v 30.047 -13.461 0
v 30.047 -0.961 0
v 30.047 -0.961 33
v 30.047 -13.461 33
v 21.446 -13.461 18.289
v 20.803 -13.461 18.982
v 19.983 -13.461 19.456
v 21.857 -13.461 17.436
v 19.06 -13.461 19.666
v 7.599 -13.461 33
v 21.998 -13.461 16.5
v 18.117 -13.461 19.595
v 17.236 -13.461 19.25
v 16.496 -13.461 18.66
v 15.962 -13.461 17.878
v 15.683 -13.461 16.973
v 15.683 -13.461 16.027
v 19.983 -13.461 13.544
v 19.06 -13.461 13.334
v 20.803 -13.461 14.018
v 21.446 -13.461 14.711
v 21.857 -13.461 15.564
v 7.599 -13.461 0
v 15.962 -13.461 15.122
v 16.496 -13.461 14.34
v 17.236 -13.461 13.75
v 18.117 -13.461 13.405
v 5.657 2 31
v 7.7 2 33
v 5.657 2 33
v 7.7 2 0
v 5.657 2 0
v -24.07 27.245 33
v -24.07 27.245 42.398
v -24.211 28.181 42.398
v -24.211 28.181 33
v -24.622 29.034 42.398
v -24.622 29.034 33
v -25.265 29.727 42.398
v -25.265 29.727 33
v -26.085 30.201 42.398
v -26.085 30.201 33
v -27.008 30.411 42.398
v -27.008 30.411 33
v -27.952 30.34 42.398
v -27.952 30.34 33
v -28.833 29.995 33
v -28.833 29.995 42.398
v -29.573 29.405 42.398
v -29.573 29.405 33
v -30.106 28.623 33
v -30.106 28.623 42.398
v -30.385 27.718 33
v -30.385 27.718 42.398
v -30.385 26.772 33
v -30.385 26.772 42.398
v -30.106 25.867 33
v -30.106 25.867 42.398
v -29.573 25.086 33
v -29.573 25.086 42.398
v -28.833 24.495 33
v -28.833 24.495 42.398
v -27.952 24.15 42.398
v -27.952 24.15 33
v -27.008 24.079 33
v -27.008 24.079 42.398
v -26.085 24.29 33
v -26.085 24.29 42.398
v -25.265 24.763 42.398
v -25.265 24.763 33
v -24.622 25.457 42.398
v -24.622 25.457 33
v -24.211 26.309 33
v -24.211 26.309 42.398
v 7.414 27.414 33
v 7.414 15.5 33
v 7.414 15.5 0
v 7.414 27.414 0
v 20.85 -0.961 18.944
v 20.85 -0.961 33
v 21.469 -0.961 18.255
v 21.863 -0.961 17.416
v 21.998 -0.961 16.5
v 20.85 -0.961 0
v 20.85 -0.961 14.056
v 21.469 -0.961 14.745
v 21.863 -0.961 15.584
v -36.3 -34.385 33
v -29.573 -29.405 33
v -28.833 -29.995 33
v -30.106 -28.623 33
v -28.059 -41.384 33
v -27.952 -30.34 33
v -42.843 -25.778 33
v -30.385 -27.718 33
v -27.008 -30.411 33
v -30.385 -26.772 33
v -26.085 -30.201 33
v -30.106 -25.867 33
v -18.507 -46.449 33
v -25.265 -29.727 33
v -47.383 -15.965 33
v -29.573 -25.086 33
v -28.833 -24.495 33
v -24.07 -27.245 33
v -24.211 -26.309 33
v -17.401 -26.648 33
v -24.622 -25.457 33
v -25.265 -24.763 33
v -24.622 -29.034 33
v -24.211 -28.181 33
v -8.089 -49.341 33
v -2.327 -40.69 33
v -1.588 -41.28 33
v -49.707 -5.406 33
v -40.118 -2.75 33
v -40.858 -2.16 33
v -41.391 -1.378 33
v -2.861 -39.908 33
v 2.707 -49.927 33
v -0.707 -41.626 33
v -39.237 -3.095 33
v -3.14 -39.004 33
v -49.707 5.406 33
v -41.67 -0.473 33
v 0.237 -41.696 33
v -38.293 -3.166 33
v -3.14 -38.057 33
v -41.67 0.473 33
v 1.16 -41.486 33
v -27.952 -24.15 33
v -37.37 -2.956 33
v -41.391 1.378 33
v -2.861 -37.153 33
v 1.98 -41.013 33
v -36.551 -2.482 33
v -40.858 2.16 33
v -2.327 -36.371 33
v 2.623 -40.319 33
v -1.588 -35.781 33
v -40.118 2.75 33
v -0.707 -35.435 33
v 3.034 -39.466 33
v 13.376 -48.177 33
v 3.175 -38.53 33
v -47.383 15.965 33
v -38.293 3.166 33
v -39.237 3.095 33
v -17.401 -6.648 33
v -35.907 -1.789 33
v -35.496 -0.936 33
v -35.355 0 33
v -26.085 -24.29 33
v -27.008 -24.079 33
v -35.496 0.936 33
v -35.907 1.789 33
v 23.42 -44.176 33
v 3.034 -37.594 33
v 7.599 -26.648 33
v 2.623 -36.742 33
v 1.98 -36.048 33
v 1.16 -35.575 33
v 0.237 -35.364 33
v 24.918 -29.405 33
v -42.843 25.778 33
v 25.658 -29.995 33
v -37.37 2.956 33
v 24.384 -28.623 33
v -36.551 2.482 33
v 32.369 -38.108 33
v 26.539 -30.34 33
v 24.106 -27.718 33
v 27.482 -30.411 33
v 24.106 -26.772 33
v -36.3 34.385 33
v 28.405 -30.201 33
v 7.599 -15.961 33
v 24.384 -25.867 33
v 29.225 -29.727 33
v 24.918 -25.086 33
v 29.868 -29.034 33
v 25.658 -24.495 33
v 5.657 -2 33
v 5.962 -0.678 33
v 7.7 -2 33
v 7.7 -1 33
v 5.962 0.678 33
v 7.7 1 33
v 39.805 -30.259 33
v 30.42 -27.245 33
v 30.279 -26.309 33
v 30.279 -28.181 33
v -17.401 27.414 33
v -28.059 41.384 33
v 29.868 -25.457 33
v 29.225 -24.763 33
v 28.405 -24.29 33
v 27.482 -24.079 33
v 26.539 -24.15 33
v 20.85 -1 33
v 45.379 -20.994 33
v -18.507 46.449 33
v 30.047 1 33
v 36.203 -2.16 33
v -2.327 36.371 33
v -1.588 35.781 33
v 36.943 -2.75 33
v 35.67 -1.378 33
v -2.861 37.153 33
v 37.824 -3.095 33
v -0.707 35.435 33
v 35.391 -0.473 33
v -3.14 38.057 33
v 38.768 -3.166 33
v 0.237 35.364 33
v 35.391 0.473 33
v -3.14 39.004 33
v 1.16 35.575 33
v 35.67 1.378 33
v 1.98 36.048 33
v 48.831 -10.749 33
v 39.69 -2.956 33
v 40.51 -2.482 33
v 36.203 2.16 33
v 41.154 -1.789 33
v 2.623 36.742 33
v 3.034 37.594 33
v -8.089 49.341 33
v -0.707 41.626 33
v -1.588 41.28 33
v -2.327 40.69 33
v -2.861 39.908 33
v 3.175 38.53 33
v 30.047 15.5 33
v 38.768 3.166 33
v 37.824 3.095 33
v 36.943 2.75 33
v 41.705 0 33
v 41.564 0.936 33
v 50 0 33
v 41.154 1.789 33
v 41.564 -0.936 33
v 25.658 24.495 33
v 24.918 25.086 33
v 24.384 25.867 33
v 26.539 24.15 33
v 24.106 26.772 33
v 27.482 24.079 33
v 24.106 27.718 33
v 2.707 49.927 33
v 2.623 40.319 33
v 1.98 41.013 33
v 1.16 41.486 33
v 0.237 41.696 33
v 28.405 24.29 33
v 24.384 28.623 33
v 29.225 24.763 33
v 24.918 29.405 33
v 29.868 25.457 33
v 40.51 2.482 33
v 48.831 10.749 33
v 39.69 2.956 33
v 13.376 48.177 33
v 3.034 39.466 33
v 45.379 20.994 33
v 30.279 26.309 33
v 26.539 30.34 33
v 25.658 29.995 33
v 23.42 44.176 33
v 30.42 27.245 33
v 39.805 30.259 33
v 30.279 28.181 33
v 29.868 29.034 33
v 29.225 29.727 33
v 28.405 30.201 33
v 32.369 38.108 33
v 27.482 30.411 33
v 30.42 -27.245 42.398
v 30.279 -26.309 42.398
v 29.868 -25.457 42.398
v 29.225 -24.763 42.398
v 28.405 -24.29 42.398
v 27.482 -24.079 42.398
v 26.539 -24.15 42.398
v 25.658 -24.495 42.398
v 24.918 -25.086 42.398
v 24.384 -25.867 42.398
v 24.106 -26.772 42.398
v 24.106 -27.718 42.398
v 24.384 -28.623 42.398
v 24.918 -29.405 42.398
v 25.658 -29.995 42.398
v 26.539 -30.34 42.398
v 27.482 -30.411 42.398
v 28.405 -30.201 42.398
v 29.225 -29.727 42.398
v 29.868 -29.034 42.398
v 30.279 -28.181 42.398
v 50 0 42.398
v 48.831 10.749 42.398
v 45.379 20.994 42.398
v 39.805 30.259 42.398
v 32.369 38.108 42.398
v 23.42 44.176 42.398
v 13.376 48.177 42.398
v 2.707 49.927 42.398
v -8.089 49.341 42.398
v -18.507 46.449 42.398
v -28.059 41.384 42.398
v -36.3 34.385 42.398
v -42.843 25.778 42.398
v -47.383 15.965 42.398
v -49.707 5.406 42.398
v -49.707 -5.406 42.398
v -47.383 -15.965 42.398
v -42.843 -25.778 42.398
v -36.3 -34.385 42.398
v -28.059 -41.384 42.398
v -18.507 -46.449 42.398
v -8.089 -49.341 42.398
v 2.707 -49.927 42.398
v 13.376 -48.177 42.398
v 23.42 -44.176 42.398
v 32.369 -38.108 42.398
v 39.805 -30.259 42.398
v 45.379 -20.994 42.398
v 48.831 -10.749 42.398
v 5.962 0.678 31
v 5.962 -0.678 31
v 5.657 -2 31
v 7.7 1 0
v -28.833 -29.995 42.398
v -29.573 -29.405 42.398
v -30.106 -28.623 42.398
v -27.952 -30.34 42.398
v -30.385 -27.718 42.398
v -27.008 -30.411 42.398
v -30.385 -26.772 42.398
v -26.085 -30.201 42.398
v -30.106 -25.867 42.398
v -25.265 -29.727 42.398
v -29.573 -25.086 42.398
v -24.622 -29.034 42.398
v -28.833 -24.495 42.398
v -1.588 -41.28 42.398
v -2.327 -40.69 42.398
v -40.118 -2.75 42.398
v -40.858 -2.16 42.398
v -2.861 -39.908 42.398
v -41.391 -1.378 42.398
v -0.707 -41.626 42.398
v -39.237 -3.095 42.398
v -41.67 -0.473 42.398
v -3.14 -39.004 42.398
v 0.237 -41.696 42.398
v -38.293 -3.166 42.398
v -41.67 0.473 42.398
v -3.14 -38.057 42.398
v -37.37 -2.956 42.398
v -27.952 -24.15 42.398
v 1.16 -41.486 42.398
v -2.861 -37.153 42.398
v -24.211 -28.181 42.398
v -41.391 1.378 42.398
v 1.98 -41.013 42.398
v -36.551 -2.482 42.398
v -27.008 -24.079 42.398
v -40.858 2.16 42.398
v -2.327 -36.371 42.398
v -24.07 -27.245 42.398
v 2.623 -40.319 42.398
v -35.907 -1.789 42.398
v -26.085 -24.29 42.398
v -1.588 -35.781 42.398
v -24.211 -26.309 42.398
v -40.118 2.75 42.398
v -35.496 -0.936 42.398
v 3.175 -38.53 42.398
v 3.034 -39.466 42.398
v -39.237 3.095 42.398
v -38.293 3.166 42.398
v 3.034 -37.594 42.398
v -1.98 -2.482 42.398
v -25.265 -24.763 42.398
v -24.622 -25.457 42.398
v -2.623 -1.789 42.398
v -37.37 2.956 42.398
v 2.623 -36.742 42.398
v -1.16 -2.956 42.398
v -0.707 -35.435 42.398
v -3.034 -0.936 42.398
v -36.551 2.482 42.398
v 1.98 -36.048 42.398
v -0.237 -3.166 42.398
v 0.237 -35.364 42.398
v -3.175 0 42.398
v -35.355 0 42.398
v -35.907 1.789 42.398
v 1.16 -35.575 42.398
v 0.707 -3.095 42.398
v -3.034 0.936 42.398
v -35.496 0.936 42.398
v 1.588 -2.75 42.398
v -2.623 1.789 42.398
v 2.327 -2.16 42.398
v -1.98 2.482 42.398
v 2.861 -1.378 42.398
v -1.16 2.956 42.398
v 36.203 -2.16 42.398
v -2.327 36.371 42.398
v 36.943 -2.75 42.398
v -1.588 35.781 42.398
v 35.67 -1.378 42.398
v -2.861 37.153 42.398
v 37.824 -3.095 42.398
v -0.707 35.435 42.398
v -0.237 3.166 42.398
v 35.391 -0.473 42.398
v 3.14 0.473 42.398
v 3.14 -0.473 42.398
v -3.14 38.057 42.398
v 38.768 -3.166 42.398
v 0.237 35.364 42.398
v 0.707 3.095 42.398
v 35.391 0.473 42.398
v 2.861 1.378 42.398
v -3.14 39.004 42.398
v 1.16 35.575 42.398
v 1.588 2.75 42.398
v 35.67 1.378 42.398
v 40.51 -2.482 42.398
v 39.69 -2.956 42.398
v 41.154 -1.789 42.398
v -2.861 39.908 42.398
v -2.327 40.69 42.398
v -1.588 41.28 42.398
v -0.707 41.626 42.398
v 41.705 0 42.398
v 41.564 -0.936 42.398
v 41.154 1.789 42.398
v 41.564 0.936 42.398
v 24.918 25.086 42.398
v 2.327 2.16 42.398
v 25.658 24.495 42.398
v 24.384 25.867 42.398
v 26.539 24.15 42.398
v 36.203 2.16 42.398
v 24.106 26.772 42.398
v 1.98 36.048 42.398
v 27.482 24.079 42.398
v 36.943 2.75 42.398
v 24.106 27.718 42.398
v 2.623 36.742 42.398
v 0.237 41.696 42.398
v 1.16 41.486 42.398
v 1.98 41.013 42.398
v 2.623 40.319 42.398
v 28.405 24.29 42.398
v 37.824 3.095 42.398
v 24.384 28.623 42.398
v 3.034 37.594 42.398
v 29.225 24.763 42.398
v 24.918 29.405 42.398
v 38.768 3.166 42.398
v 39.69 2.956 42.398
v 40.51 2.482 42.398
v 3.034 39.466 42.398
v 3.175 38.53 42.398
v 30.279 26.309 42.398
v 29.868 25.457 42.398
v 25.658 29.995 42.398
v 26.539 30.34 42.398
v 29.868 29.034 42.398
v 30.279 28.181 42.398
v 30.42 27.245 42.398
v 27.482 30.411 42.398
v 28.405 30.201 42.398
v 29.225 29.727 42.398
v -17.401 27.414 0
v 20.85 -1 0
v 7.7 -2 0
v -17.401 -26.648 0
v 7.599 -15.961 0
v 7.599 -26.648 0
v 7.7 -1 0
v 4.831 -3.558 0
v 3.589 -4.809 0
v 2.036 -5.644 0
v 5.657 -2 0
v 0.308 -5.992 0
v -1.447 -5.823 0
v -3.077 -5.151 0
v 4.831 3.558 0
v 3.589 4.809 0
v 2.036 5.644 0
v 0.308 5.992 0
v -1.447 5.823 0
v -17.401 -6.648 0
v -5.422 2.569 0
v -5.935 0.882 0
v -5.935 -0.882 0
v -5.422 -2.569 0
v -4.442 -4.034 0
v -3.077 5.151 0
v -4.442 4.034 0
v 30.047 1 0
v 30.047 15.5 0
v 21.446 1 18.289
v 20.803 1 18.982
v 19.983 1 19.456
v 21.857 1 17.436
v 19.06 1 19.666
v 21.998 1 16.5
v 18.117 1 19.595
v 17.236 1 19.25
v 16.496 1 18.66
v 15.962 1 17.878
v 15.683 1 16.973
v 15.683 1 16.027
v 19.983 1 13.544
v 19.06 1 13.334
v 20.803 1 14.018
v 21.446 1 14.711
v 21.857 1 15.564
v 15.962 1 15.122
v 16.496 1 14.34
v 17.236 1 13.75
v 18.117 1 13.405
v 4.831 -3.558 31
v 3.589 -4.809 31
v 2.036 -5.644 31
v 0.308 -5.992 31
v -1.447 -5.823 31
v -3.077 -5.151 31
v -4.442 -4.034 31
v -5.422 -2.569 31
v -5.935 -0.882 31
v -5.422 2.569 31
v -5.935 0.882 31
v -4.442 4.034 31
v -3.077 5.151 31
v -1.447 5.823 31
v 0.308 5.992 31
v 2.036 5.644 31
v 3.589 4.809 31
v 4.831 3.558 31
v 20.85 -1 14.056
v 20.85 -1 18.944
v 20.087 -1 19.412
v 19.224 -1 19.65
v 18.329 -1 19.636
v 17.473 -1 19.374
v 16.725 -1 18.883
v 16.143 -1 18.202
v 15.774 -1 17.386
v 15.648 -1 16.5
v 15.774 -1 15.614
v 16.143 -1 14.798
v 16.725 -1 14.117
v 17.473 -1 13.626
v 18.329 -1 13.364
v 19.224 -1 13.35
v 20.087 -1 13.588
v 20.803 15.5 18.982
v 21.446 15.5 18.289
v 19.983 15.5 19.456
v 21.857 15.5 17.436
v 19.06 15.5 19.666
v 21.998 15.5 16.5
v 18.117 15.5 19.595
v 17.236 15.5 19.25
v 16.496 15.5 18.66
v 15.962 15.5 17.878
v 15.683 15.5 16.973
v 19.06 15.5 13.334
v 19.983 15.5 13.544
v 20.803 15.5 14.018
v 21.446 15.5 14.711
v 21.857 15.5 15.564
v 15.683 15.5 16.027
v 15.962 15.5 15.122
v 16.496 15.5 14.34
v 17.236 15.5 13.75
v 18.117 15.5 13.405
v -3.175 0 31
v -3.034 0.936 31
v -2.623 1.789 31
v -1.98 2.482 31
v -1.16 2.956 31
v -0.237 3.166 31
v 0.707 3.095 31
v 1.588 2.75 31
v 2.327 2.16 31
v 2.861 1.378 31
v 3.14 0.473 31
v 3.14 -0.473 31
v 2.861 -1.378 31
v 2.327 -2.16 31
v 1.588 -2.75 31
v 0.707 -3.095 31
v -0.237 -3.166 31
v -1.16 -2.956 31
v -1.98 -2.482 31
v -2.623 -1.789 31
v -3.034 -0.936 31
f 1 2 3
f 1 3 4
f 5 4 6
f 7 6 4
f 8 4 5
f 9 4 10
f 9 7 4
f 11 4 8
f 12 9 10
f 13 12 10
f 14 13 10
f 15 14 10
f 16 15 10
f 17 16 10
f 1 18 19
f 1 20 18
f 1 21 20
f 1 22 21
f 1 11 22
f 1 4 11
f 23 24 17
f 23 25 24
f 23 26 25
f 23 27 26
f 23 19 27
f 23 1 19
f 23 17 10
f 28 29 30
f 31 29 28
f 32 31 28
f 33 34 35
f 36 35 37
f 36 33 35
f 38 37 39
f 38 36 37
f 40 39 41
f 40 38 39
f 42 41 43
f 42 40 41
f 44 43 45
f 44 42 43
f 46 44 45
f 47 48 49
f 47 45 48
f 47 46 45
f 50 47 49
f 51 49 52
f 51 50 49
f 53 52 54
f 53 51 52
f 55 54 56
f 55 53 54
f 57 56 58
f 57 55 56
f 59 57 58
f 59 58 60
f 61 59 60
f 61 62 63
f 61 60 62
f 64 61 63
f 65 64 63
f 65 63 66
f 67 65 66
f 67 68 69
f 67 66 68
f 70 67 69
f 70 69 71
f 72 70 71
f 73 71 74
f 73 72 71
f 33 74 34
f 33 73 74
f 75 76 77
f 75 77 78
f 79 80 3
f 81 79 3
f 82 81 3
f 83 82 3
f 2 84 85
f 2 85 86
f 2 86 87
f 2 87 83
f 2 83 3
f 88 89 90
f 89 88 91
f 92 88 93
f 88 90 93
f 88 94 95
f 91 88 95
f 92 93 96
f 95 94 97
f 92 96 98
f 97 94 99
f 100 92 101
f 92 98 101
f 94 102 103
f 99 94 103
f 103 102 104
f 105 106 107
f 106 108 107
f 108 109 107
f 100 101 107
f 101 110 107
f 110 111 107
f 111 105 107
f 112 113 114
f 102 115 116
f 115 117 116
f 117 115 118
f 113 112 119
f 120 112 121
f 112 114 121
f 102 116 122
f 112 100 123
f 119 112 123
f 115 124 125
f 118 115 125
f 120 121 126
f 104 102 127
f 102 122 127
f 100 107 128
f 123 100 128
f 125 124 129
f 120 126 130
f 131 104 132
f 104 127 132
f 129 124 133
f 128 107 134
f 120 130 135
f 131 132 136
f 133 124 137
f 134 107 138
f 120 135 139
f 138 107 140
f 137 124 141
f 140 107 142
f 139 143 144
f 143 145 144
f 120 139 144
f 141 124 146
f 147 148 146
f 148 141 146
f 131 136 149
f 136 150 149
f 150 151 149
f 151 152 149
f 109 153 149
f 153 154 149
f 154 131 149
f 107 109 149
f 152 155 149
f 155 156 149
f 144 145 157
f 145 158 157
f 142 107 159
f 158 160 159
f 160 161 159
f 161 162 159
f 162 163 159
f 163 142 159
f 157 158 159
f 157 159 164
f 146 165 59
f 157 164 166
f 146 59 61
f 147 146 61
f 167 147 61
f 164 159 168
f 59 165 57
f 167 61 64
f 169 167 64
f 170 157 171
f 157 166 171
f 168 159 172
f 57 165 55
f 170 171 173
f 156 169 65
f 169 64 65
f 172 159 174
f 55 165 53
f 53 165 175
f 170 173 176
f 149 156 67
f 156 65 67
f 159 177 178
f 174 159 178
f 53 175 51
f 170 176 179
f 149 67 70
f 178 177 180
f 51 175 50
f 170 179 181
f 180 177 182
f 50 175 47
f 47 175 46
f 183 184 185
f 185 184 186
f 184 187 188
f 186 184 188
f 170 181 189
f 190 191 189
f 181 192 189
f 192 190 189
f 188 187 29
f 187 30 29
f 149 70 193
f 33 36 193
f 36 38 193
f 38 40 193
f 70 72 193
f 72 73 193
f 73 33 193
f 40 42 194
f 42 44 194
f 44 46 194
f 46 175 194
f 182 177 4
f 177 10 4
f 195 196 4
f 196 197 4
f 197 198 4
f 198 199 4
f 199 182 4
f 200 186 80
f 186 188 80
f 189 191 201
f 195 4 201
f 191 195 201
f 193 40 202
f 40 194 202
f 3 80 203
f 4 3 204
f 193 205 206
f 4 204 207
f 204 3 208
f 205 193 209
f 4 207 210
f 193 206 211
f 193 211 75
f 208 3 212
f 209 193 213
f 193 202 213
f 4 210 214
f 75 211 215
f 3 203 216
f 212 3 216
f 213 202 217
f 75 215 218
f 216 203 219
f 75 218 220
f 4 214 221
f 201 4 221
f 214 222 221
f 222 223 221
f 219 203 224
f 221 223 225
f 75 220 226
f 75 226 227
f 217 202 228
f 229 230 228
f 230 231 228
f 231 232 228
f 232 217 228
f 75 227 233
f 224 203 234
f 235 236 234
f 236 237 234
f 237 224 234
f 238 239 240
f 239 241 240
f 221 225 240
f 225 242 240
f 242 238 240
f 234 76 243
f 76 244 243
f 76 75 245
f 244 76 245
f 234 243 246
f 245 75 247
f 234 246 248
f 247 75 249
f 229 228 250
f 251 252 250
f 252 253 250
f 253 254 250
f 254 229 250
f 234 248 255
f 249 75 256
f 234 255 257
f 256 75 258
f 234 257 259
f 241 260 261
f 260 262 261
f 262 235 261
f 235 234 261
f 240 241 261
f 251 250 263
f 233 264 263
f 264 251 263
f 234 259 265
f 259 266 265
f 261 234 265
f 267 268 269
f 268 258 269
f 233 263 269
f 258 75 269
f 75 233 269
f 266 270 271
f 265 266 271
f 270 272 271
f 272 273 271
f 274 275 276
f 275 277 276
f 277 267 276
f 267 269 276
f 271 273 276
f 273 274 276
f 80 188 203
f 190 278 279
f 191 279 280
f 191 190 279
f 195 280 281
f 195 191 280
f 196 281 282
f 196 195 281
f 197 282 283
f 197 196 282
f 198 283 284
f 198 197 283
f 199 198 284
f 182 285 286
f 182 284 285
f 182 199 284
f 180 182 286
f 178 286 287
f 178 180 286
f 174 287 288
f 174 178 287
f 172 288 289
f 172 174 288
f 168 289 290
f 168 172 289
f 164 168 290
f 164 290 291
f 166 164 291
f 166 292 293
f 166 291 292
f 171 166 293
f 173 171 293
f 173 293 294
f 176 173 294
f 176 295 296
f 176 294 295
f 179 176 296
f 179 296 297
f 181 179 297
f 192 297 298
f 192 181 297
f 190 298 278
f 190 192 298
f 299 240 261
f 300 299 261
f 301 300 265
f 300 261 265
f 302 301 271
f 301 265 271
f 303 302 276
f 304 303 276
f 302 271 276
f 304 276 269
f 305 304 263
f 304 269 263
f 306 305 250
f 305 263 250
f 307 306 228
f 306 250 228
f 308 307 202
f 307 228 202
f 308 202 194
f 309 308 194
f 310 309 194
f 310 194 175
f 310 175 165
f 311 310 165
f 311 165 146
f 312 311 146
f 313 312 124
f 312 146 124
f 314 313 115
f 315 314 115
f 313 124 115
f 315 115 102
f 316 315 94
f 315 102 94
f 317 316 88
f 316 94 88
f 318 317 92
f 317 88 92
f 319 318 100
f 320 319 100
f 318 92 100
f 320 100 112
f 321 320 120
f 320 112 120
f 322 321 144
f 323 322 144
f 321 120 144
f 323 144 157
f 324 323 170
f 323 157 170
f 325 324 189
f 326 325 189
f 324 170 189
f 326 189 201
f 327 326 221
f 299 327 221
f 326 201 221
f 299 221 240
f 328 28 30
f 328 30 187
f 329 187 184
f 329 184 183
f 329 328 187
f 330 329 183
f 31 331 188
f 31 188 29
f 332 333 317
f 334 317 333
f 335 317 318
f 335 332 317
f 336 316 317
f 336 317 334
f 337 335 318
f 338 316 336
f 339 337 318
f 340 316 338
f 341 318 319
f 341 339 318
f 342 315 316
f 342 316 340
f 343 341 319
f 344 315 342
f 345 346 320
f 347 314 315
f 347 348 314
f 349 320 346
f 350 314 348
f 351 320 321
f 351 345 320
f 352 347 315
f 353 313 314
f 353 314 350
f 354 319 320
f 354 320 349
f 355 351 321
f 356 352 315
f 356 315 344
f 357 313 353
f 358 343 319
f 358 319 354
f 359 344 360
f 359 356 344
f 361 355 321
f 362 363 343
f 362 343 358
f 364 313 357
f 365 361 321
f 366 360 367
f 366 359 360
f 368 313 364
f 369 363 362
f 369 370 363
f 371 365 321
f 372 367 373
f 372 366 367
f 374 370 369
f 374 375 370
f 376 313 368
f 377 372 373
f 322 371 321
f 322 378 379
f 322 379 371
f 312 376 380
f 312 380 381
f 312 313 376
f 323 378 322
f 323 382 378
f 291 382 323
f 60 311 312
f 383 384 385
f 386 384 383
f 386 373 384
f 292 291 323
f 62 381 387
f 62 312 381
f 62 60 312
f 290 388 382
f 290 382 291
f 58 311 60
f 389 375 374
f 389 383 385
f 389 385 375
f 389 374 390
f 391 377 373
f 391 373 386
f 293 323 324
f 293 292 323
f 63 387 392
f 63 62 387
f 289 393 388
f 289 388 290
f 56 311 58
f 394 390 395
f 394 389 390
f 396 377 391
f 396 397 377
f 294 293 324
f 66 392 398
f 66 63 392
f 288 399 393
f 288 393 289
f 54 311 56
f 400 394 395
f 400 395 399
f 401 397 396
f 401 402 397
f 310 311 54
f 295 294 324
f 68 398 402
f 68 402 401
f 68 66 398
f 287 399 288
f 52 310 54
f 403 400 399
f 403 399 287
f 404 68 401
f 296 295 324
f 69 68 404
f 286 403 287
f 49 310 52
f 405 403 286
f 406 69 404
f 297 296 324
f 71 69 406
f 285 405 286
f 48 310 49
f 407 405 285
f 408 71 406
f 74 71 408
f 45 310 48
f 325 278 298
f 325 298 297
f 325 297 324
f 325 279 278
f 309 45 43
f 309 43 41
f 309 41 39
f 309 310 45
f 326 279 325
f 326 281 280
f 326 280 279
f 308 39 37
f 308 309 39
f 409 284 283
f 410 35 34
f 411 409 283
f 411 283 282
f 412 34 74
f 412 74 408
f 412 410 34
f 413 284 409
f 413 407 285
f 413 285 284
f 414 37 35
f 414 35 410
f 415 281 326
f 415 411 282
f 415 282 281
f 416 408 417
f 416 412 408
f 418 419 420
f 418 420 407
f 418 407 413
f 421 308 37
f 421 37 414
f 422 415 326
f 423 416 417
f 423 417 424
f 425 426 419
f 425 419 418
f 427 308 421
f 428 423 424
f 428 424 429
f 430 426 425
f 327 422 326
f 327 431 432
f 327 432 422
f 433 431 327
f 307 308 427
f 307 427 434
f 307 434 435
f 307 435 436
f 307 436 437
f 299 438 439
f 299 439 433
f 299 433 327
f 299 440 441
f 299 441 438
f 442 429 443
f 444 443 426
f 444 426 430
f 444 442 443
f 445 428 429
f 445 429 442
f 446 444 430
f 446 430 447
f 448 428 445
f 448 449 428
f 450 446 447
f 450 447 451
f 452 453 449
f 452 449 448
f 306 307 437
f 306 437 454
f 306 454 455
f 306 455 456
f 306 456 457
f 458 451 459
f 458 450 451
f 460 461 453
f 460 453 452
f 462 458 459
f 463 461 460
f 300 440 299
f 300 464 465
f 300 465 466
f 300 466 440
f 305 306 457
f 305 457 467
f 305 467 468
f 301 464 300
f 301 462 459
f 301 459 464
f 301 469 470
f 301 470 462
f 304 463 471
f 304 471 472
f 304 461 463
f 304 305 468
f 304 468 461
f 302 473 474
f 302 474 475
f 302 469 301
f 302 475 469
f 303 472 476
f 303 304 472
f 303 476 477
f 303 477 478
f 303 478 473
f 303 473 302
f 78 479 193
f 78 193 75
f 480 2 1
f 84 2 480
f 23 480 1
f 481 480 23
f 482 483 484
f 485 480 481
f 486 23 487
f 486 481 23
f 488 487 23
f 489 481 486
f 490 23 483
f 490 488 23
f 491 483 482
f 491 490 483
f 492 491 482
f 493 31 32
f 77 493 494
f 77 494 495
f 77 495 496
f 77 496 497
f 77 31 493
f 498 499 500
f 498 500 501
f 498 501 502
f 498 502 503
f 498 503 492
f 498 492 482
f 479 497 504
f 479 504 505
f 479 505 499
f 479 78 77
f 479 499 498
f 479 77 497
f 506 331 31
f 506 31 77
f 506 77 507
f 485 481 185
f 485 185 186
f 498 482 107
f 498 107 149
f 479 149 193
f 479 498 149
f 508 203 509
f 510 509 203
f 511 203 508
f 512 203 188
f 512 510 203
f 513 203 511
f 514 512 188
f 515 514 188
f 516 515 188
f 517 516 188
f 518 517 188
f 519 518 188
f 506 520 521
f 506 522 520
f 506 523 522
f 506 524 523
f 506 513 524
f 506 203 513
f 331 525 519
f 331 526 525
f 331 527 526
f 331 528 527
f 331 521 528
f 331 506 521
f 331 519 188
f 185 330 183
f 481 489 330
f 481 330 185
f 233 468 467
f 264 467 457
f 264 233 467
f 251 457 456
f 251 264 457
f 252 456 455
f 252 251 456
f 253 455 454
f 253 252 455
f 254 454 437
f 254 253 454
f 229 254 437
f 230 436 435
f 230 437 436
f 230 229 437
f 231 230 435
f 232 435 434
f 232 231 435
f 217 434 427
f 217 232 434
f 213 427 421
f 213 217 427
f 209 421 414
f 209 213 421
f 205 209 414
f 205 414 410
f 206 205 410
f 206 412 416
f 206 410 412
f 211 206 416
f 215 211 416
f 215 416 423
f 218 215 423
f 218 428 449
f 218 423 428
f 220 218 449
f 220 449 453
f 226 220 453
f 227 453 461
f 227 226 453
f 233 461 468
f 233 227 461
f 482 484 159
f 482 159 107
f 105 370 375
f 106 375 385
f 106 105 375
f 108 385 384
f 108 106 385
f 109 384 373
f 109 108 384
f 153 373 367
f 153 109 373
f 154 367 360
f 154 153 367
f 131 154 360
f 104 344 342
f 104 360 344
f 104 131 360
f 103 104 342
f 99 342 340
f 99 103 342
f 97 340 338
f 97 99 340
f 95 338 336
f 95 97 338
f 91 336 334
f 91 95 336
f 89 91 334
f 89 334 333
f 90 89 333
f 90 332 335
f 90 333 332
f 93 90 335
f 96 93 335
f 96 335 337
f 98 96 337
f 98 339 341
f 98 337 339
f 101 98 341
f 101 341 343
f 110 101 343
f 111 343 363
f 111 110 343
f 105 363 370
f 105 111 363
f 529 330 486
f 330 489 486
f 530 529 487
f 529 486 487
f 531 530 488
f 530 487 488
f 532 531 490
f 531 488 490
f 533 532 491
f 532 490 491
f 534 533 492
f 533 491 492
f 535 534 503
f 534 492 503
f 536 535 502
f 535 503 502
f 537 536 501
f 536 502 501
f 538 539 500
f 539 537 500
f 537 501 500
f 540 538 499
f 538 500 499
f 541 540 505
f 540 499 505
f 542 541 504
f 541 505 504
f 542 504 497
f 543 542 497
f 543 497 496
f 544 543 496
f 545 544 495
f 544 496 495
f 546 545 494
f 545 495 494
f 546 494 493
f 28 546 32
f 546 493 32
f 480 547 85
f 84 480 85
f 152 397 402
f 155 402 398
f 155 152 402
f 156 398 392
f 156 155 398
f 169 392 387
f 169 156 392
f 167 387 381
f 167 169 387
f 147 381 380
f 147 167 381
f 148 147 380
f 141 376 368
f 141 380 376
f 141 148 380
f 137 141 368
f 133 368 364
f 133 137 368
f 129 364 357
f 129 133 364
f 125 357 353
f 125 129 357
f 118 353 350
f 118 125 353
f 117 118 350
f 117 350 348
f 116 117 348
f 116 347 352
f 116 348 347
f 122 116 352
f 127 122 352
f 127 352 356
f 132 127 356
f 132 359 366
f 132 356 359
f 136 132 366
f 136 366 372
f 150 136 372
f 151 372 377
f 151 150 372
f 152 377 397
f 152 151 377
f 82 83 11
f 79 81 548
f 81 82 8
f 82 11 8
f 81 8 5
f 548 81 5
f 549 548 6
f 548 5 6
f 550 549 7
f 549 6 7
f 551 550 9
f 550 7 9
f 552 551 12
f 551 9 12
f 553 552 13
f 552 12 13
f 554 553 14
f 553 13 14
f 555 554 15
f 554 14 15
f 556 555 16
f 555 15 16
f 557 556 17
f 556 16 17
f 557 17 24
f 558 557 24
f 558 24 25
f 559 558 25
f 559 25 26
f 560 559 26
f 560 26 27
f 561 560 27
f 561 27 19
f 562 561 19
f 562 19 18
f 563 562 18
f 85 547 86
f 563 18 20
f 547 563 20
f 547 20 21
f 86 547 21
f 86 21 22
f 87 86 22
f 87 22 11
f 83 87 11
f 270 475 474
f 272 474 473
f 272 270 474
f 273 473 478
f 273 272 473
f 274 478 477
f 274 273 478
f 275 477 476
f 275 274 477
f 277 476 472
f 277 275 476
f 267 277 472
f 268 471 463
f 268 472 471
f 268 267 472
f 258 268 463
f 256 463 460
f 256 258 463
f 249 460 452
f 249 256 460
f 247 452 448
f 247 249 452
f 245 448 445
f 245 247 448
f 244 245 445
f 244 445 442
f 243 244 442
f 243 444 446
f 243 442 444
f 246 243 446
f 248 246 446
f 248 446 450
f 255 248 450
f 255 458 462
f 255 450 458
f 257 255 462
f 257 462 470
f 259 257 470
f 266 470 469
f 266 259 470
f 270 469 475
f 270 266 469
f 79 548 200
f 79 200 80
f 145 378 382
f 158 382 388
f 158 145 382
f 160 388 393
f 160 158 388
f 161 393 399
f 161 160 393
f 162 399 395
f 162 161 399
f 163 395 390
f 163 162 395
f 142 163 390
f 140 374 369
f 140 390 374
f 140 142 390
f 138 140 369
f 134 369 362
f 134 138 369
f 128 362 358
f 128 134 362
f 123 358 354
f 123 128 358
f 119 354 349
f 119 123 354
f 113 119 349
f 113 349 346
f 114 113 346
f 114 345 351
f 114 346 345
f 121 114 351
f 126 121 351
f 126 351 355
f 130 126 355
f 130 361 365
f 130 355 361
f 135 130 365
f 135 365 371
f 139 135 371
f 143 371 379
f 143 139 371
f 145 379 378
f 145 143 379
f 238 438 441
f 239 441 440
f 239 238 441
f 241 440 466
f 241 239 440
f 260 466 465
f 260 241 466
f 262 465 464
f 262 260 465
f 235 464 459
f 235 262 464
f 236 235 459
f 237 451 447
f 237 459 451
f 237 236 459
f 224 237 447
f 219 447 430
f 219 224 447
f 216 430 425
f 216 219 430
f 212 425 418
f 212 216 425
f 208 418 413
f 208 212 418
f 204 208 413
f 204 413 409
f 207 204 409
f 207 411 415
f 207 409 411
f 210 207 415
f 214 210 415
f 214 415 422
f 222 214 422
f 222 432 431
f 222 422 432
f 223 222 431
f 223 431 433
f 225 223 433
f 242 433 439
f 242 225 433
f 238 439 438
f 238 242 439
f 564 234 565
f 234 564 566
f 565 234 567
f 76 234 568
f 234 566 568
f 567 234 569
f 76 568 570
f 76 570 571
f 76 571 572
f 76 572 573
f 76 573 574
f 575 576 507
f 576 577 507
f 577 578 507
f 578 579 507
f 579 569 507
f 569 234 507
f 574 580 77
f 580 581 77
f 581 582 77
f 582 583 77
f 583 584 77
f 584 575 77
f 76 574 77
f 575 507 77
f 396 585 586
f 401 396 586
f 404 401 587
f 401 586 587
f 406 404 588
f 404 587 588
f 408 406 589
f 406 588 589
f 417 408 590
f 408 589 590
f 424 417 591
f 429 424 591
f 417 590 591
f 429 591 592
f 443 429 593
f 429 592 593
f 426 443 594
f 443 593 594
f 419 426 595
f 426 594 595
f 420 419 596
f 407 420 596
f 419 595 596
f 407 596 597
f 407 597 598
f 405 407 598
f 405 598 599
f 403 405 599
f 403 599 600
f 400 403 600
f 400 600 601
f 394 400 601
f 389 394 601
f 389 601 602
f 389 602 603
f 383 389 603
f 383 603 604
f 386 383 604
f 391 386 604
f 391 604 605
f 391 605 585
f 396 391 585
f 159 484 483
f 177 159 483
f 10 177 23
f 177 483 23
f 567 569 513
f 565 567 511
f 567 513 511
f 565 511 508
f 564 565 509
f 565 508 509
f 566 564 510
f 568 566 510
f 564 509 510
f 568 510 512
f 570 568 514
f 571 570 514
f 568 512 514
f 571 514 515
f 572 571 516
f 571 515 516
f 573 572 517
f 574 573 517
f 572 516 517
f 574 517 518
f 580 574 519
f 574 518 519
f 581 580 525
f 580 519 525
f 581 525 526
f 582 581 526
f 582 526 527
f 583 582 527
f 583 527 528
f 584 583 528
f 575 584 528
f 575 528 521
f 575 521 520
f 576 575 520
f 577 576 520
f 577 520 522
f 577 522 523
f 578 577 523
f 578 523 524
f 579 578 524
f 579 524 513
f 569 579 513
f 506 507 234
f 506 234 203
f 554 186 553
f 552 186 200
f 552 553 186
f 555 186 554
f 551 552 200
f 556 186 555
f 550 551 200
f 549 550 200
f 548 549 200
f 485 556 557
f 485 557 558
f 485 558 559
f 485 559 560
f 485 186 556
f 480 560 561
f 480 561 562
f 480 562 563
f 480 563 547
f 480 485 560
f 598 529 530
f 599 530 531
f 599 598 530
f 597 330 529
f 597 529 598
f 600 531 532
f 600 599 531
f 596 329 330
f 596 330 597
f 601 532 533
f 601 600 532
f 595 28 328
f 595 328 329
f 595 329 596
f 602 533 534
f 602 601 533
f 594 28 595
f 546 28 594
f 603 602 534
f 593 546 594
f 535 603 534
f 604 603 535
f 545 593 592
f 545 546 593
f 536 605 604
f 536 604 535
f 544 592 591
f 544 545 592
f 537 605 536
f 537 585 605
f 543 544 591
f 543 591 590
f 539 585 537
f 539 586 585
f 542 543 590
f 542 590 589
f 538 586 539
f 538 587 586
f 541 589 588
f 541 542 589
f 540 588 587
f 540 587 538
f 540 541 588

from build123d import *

# Parameters (mm, degrees)
SKETCH_1_W           = 30
SKETCH_1_H           = 14.828427124
EXTRUDE_2_DEPTH      = 33
CUT_EXTRUDE_9_DEPTH  = 46
CUT_EXTRUDE_10_DEPTH = 30
CUT_EXTRUDE_12_DEPTH = 40
CUT_EXTRUDE_13_DEPTH = 46
CUT_EXTRUDE_18_DEPTH = 285
SKETCH_12_R          = 50
EXTRUDE_7_DEPTH      = 9.398
SKETCH_12_5_R        = 3.175
CUT_EXTRUDE_27_DEPTH = 63
SKETCH_20_R          = 6
SKETCH_20_R_2        = 3.175
EXTRUDE_9_DEPTH      = 3
SKETCH_1_26_W        = 11
SKETCH_1_26_H        = 2
CUT_EXTRUDE_29_DEPTH = 31
SKETCH_1_27_W        = 11
SKETCH_1_27_H        = 2
CUT_EXTRUDE_30_DEPTH = 33
CUT_EXTRUDE_31_DEPTH = 33
CUT_EXTRUDE_32_DEPTH = 33
SKETCH_21_R          = 6
SKETCH_21_R_2        = 3.175
EXTRUDE_11_DEPTH     = 34
SKETCH_21_5_R        = 6
SKETCH_21_5_R_2      = 3.175
CUT_EXTRUDE_34_DEPTH = 31
SKETCH_22_R          = 3.175
CUT_EXTRUDE_35_DEPTH = 31
SKETCH_24_W          = 25
SKETCH_24_H          = 20
EXTRUDE_12_DEPTH     = 33
EXTRUDE_13_DEPTH     = 34
SKETCH_25_W          = 9.1968428
SKETCH_25_H          = 2.038804585
SKETCH_25_H_2        = 2
EXTRUDE_14_DEPTH     = 33
EXTRUDE_15_DEPTH     = 36
SKETCH_28_W          = 22.632732516
SKETCH_28_H          = 2.5
SKETCH_28_W_2        = 22.447864345
CUT_EXTRUDE_43_DEPTH = 33
SKETCH_1_32_W        = 0.7
SKETCH_1_32_H        = 1
CUT_EXTRUDE_45_DEPTH = 33
SKETCH_27_R          = 3.175
CUT_EXTRUDE_46_DEPTH = 70


with BuildPart() as part:
    # 草图1 → 凸台-拉伸2 (new body)
    with BuildSketch(Plane.XY):
        with Locations((7.585786438, 0)):
            Rectangle(SKETCH_1_W, SKETCH_1_H)
    extrude(amount=EXTRUDE_2_DEPTH)

    # 草图1<11> → 切除-拉伸9 (cut)
    with BuildSketch(Plane.XY):
        with BuildLine():
            Line((0, -2), (0, 0))
            Line((0, 0), (-6, 0))
            ThreePointArc((-6, 0), (-4.242640687, -4.242640687), (0, -6))
            ThreePointArc((0, -6), (3.464101615, -4.898979486), (5.656854249, -2))
            Line((5.656854249, -2), (0, -2))
        make_face()
    extrude(amount=CUT_EXTRUDE_9_DEPTH, mode=Mode.SUBTRACT)

    # 草图1<12> → 切除-拉伸10 (cut)
    with BuildSketch(Plane.XY):
        with BuildLine():
            Line((-6, 0), (0, 0))
            Line((0, 0), (0, 2))
            Line((0, 2), (0, 6))
            ThreePointArc((0, 6), (-4.242640687, 4.242640687), (-6, 0))
        make_face()
    extrude(amount=CUT_EXTRUDE_10_DEPTH, mode=Mode.SUBTRACT)

    # 草图1<14> → 切除-拉伸12 (cut)
    with BuildSketch(Plane.XY):
        with BuildLine():
            Line((6, 0), (0, 0))
            Line((0, 0), (0, -2))
            Line((0, -2), (5.656854249, -2))
            ThreePointArc((5.656854249, -2), (5.913591358, -1.014611872), (6, 0))
        make_face()
    extrude(amount=CUT_EXTRUDE_12_DEPTH, mode=Mode.SUBTRACT)

    # 草图1<15> → 切除-拉伸13 (cut)
    with BuildSketch(Plane.XY):
        with BuildLine():
            Line((0, 6), (0, 2))
            Line((0, 2), (5.656854249, 2))
            ThreePointArc((5.656854249, 2), (3.464101615, 4.898979486), (0, 6))
        make_face()
    extrude(amount=CUT_EXTRUDE_13_DEPTH, mode=Mode.SUBTRACT)

    # 草图1<20> → 切除-拉伸18 (cut)
    with BuildSketch(Plane.XY):
        with BuildLine():
            ThreePointArc((7.414213562, 7.414213562), (9.005239827, 5.370919954), (10.046946078, 3))
            Line((10.046946078, 3), (18, 3))
            Line((18, 3), (20.850103278, 3))
            Line((20.850103278, 3), (20.850103278, 1))
            Line((20.850103278, 1), (18, 1))
            Line((18, 1), (18, -1))
            Line((18, -1), (20.850103278, -1))
            Line((20.850103278, -1), (20.850103278, -3))
            Line((20.850103278, -3), (18, -3))
            Line((18, -3), (10.046946078, -3))
            ThreePointArc((10.046946078, -3), (9.005239827, -5.370919954), (7.414213562, -7.414213562))
            Line((7.414213562, -7.414213562), (22.585786438, -7.414213562))
            Line((22.585786438, -7.414213562), (22.585786438, 7.414213562))
            Line((22.585786438, 7.414213562), (7.414213562, 7.414213562))
        make_face()
    extrude(amount=CUT_EXTRUDE_18_DEPTH, mode=Mode.SUBTRACT)

    # 草图12 → 凸台-拉伸7 (add)
    with BuildSketch(Plane.XY.offset(33)):
        Circle(SKETCH_12_R)
    extrude(amount=EXTRUDE_7_DEPTH)

    # 草图12<5> → 切除-拉伸27 (cut)
    with BuildSketch(Plane.XY.offset(33)):
        with Locations((0, 38.530339059)):
            Circle(SKETCH_12_5_R)
        with Locations((-27.24506403, 27.24506403)):
            Circle(SKETCH_12_5_R)
        with Locations((27.24506403, -27.24506403)):
            Circle(SKETCH_12_5_R)
        with Locations((-38.530339059, 0)):
            Circle(SKETCH_12_5_R)
        with Locations((38.530339059, 0)):
            Circle(SKETCH_12_5_R)
        with Locations((0, -38.530339059)):
            Circle(SKETCH_12_5_R)
        with Locations((-27.24506403, -27.24506403)):
            Circle(SKETCH_12_5_R)
        with Locations((27.24506403, 27.24506403)):
            Circle(SKETCH_12_5_R)
    extrude(amount=CUT_EXTRUDE_27_DEPTH, mode=Mode.SUBTRACT)

    # 草图20 → 凸台-拉伸9 (add)
    with BuildSketch(Plane(origin=(0, 0, 0), x_dir=(-1, 0, 0), z_dir=(0, 0, -1))):
        Circle(SKETCH_20_R)
        Circle(SKETCH_20_R_2, mode=Mode.SUBTRACT)
    extrude(amount=-EXTRUDE_9_DEPTH)

    # 草图1<26> → 切除-拉伸29 (cut)
    with BuildSketch(Plane.XY):
        with Locations((12.5, 0)):
            Rectangle(SKETCH_1_26_W, SKETCH_1_26_H)
    extrude(amount=CUT_EXTRUDE_29_DEPTH, mode=Mode.SUBTRACT)

    # 草图1<27> → 切除-拉伸30 (cut)
    with BuildSketch(Plane.XY):
        with BuildLine():
            Line((0, 2), (0, 0))
            Line((0, 0), (6, 0))
            ThreePointArc((6, 0), (5.913591358, 1.014611872), (5.656854249, 2))
            Line((5.656854249, 2), (0, 2))
        make_face()
        with Locations((12.5, 0)):
            Rectangle(SKETCH_1_27_W, SKETCH_1_27_H)
    extrude(amount=CUT_EXTRUDE_30_DEPTH, mode=Mode.SUBTRACT)

    # 草图1<28> → 切除-拉伸31 (cut)
    with BuildSketch(Plane.XY):
        with BuildLine():
            Line((6, 0), (0, 0))
            Line((0, 0), (0, -2))
            Line((0, -2), (7, -2))
            Line((7, -2), (7, 2))
            Line((7, 2), (5.656854249, 2))
            ThreePointArc((5.656854249, 2), (5.913591358, 1.014611872), (6, 0))
        make_face()
        with BuildLine():
            Line((-6, 0), (0, 0))
            Line((0, 0), (0, 6))
            ThreePointArc((0, 6), (-4.242640687, 4.242640687), (-6, 0))
        make_face()
    extrude(amount=CUT_EXTRUDE_31_DEPTH, mode=Mode.SUBTRACT)

    # 草图1<29> → 切除-拉伸32 (cut)
    with BuildSketch(Plane.XY):
        with BuildLine():
            Line((0, -2), (0, 0))
            Line((0, 0), (-6, 0))
            ThreePointArc((-6, 0), (-1.014611872, -5.913591358), (5.656854249, -2))
            Line((5.656854249, -2), (0, -2))
        make_face()
        with BuildLine():
            Line((0, 6), (0, 2))
            Line((0, 2), (5.656854249, 2))
            ThreePointArc((5.656854249, 2), (3.464101615, 4.898979486), (0, 6))
        make_face()
    extrude(amount=CUT_EXTRUDE_32_DEPTH, mode=Mode.SUBTRACT)

    # 草图21 → 凸台-拉伸11 (add)
    with BuildSketch(Plane(origin=(0, 0, 0), x_dir=(-1, 0, 0), z_dir=(0, 0, -1))):
        Circle(SKETCH_21_R)
        Circle(SKETCH_21_R_2, mode=Mode.SUBTRACT)
    extrude(amount=-EXTRUDE_11_DEPTH)

    # 草图21<5> → 切除-拉伸34 (cut)
    with BuildSketch(Plane(origin=(0, 0, 0), x_dir=(-1, 0, 0), z_dir=(0, 0, -1))):
        Circle(SKETCH_21_5_R)
        Circle(SKETCH_21_5_R_2, mode=Mode.SUBTRACT)
    extrude(amount=-CUT_EXTRUDE_34_DEPTH, mode=Mode.SUBTRACT)

    # 草图22 → 切除-拉伸35 (cut)
    with BuildSketch(Plane(origin=(0, 0, 33), x_dir=(-1, 0, 0), z_dir=(0, 0, -1))):
        Circle(SKETCH_22_R)
    extrude(amount=-CUT_EXTRUDE_35_DEPTH, mode=Mode.SUBTRACT)

    # 草图24 → 凸台-拉伸12 (add)
    with BuildSketch(Plane(origin=(0, 0, 0), x_dir=(-1, 0, 0), z_dir=(0, 0, -1))):
        with Locations((4.900918267, -16.64791006)):
            Rectangle(SKETCH_24_W, SKETCH_24_H)
    extrude(amount=-EXTRUDE_12_DEPTH)

    # 草图24<3> → 凸台-拉伸13 (add)
    with BuildSketch(Plane(origin=(0, 0, 0), x_dir=(-1, 0, 0), z_dir=(0, 0, -1))):
        Polygon((-7.414213562, 27.414213562), (-7.414213562, 7.414213562), (7.414213562, 7.414213562), (7.414213562, -6.64791006), (17.400918267, -6.64791006), (17.400918267, 27.414213562), align=None)
    extrude(amount=-EXTRUDE_13_DEPTH)

    # 草图25 → 凸台-拉伸14 (add)
    with BuildSketch(Plane(origin=(0, 0, 0), x_dir=(-1, 0, 0), z_dir=(0, 0, -1))):
        with Locations((-25.448524678, -1.980597708)):
            Rectangle(SKETCH_25_W, SKETCH_25_H)
        with Locations((-25.448524678, 2)):
            Rectangle(SKETCH_25_W, SKETCH_25_H_2)
    extrude(amount=-EXTRUDE_14_DEPTH)

    # 草图26 → 凸台-拉伸15 (add)
    with BuildSketch(Plane(origin=(0, 0, 0), x_dir=(-1, 0, 0), z_dir=(0, 0, -1))):
        with BuildLine():
            Line((-10.046946078, -3), (-30.046946078, -3))
            Line((-30.046946078, -3), (-30.046946078, -15.961195415))
            Line((-30.046946078, -15.961195415), (-7.599081733, -15.961195415))
            Line((-7.599081733, -15.961195415), (-7.599081733, -7.224616412))
            ThreePointArc((-7.599081733, -7.224616412), (-9.072343707, -5.256777069), (-10.046946078, -3))
        make_face()
        with BuildLine():
            Line((-30.046946078, 18), (-30.046946078, 3))
            Line((-30.046946078, 3), (-10.046946078, 3))
            ThreePointArc((-10.046946078, 3), (-9.005239827, 5.370919954), (-7.414213562, 7.414213562))
            Line((-7.414213562, 7.414213562), (-7.414213562, 18))
            Line((-7.414213562, 18), (-30.046946078, 18))
        make_face()
    extrude(amount=-EXTRUDE_15_DEPTH)

    # 草图28 → 切除-拉伸43 (cut)
    with BuildSketch(Plane(origin=(0, 0, 0), x_dir=(-1, 0, 0), z_dir=(0, 0, -1))):
        with Locations((-18.73057982, 16.75)):
            Rectangle(SKETCH_28_W, SKETCH_28_H)
        with Locations((-18.823013906, -14.711195415)):
            Rectangle(SKETCH_28_W_2, SKETCH_28_H)
    extrude(amount=-CUT_EXTRUDE_43_DEPTH, mode=Mode.SUBTRACT)

    # 草图1<32> → 切除-拉伸45 (cut)
    with BuildSketch(Plane.XY):
        with Locations((7.35, -1.5)):
            Rectangle(SKETCH_1_32_W, SKETCH_1_32_H)
        with Locations((7.35, 1.5)):
            Rectangle(SKETCH_1_32_W, SKETCH_1_32_H)
    extrude(amount=CUT_EXTRUDE_45_DEPTH, mode=Mode.SUBTRACT)

    # 草图27 → 切除-拉伸46 (cut)
    with BuildSketch(Plane.XZ.offset(15.961195415)):
        with Locations((18.823013906, 16.5)):
            Circle(SKETCH_27_R)
    extrude(amount=-CUT_EXTRUDE_46_DEPTH, mode=Mode.SUBTRACT)


solid = part.part
